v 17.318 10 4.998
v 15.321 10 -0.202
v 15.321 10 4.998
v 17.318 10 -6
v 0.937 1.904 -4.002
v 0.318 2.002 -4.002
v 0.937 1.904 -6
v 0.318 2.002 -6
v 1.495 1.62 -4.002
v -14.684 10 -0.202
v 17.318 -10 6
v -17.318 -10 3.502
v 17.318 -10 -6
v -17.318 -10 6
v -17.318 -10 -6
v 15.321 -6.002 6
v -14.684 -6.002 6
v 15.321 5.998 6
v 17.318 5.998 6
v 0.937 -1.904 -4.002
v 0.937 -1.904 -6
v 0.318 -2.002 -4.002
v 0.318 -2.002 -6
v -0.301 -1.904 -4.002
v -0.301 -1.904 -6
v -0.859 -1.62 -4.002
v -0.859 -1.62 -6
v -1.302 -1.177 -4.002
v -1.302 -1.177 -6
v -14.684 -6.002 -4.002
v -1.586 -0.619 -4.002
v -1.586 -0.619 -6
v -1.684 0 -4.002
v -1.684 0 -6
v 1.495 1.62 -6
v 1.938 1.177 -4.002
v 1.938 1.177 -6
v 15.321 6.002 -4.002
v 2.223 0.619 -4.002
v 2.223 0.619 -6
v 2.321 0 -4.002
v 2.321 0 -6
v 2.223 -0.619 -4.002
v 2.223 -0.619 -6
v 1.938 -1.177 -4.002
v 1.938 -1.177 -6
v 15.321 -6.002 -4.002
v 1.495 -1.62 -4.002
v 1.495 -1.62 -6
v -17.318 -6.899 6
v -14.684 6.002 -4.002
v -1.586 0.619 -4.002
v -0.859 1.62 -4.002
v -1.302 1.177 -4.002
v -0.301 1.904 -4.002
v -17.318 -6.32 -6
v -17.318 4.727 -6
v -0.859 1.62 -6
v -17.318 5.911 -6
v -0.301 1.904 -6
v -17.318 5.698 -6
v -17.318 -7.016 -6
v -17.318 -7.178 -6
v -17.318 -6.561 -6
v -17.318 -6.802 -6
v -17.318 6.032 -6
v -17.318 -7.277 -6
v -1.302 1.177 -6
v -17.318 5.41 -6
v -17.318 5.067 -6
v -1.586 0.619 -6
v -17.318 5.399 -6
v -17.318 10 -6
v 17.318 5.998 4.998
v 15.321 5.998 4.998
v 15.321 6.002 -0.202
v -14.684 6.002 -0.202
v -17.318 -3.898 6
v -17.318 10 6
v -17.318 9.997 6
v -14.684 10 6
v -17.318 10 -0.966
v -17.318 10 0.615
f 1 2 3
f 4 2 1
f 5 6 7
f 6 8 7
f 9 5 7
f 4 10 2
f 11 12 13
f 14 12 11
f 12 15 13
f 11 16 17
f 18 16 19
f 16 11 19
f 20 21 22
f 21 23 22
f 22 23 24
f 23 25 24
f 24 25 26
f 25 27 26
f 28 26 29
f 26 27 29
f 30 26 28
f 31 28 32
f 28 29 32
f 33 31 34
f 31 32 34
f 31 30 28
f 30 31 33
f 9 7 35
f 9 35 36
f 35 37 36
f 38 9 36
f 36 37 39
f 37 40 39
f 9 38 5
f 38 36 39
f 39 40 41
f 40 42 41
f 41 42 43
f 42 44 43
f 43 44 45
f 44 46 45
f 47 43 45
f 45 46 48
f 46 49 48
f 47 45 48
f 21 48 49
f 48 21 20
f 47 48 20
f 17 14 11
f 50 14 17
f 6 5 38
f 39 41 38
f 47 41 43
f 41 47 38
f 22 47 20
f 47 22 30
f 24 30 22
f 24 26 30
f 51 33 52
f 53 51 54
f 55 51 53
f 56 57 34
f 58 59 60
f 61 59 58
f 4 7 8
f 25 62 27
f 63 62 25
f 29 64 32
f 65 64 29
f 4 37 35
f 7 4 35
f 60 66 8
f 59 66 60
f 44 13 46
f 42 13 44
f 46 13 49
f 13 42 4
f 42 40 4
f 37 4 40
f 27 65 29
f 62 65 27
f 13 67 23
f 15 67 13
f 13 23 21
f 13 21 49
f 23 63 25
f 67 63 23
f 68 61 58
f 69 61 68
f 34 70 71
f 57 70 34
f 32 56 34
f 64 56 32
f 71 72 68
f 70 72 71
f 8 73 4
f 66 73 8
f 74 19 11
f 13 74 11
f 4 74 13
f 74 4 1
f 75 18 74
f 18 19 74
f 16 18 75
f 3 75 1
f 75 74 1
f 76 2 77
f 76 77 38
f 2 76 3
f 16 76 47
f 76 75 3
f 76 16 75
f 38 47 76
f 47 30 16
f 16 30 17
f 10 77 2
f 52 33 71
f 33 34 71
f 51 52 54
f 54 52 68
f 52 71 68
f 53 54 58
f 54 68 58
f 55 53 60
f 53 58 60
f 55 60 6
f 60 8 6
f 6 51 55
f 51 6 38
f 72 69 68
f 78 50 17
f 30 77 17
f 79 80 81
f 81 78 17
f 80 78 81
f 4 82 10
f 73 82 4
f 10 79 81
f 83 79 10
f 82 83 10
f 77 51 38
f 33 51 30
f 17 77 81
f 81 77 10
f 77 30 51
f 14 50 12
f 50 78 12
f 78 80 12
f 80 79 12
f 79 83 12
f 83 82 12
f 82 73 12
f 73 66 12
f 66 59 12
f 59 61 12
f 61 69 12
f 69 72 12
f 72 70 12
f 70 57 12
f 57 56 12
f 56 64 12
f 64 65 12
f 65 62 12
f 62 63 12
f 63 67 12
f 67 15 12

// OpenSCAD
// Generated from hotbed_foot_mount_v6.stl as explicit OpenSCAD polyhedron geometry.
// This file does not import or reference the STL; vertices/faces are embedded.
// Faces are wound for OpenSCAD; geometry was verified by STL export comparison.
// Source mesh: 166 triangles, 498 raw vertices; deduplicated to 83 vertices.

module hotbed_foot_mount_v6_v1() {
    polyhedron(
        points=[
            [15.320709, 10.000000, 4.998001],
            [17.317719, 10.000000, 4.998001],
            [15.320709, 10.000000, -0.202000],
            [17.317719, 10.000000, -6.000000],
            [0.936707, 1.903992, -6.000000],
            [0.936707, 1.903992, -4.001999],
            [0.317719, 2.001999, -4.001999],
            [0.317719, 2.001999, -6.000000],
            [1.494705, 1.619995, -4.001999],
            [-14.684296, 10.000000, -0.202000],
            [17.317719, -10.000000, -6.000000],
            [17.317719, -10.000000, 6.000000],
            [-17.317719, -10.000000, 3.502365],
            [-17.317719, -10.000000, 6.000000],
            [-17.317719, -10.000000, -6.000000],
            [-14.684296, -6.001999, 6.000000],
            [15.320709, -6.001999, 6.000000],
            [17.317719, 5.998001, 6.000000],
            [15.320709, 5.998001, 6.000000],
            [0.317719, -2.001999, -4.001999],
            [0.936707, -1.904007, -4.001999],
            [0.936707, -1.904007, -6.000000],
            [0.317719, -2.001999, -6.000000],
            [-0.301300, -1.904007, -4.001999],
            [-0.301300, -1.904007, -6.000000],
            [-0.859299, -1.619995, -4.001999],
            [-0.859299, -1.619995, -6.000000],
            [-1.302292, -1.177002, -6.000000],
            [-1.302292, -1.177002, -4.001999],
            [-14.684296, -6.001999, -4.001999],
            [-1.586288, -0.619003, -6.000000],
            [-1.586288, -0.619003, -4.001999],
            [-1.684296, 0.000000, -6.000000],
            [-1.684296, 0.000000, -4.001999],
            [1.494705, 1.619995, -6.000000],
            [1.937714, 1.177002, -4.001999],
            [1.937714, 1.177002, -6.000000],
            [15.320709, 6.001999, -4.001999],
            [2.222717, 0.618988, -4.001999],
            [2.222717, 0.618988, -6.000000],
            [2.320709, 0.000000, -4.001999],
            [2.320709, 0.000000, -6.000000],
            [2.222717, -0.619003, -4.001999],
            [2.222717, -0.619003, -6.000000],
            [1.937714, -1.177002, -4.001999],
            [1.937714, -1.177002, -6.000000],
            [15.320709, -6.001999, -4.001999],
            [1.494705, -1.619995, -4.001999],
            [1.494705, -1.619995, -6.000000],
            [-17.317719, -6.899017, 6.000000],
            [-1.586288, 0.618988, -4.001999],
            [-14.684296, 6.001999, -4.001999],
            [-1.302292, 1.177002, -4.001999],
            [-0.859299, 1.619995, -4.001999],
            [-0.301300, 1.903992, -4.001999],
            [-17.317719, -6.319824, -6.000000],
            [-17.317719, 4.726791, -6.000000],
            [-0.301300, 1.903992, -6.000000],
            [-0.859299, 1.619995, -6.000000],
            [-17.317719, 5.911011, -6.000000],
            [-17.317719, 5.697739, -6.000000],
            [-17.317719, -7.015549, -6.000000],
            [-17.317719, -7.178284, -6.000000],
            [-17.317719, -6.561249, -6.000000],
            [-17.317719, -6.802368, -6.000000],
            [-17.317719, 6.031937, -6.000000],
            [-17.317719, -7.276978, -6.000000],
            [-1.302292, 1.177002, -6.000000],
            [-17.317719, 5.410187, -6.000000],
            [-1.586288, 0.618988, -6.000000],
            [-17.317719, 5.067108, -6.000000],
            [-17.317719, 5.399155, -6.000000],
            [-17.317719, 10.000000, -6.000000],
            [17.317719, 5.998001, 4.998001],
            [15.320709, 5.998001, 4.998001],
            [-14.684296, 6.001999, -0.202000],
            [15.320709, 6.001999, -0.202000],
            [-17.317719, -3.897827, 6.000000],
            [-14.684296, 10.000000, 6.000000],
            [-17.317719, 10.000000, 6.000000],
            [-17.317719, 9.996964, 6.000000],
            [-17.317719, 10.000000, -0.965508],
            [-17.317719, 10.000000, 0.614704],
        ],
        faces=[
            [0, 2, 1],
            [1, 2, 3],
            [4, 6, 5],
            [4, 7, 6],
            [4, 5, 8],
            [2, 9, 3],
            [10, 12, 11],
            [11, 12, 13],
            [10, 14, 12],
            [15, 16, 11],
            [17, 16, 18],
            [17, 11, 16],
            [19, 21, 20],
            [19, 22, 21],
            [23, 22, 19],
            [23, 24, 22],
            [25, 24, 23],
            [25, 26, 24],
            [27, 25, 28],
            [27, 26, 25],
            [28, 25, 29],
            [30, 28, 31],
            [30, 27, 28],
            [32, 31, 33],
            [32, 30, 31],
            [28, 29, 31],
            [33, 31, 29],
            [34, 4, 8],
            [35, 34, 8],
            [35, 36, 34],
            [35, 8, 37],
            [38, 36, 35],
            [38, 39, 36],
            [5, 37, 8],
            [38, 35, 37],
            [40, 39, 38],
            [40, 41, 39],
            [42, 41, 40],
            [42, 43, 41],
            [44, 43, 42],
            [44, 45, 43],
            [44, 42, 46],
            [47, 45, 44],
            [47, 48, 45],
            [47, 44, 46],
            [48, 47, 21],
            [20, 21, 47],
            [20, 47, 46],
            [11, 13, 15],
            [15, 13, 49],
            [37, 5, 6],
            [37, 40, 38],
            [42, 40, 46],
            [37, 46, 40],
            [20, 46, 19],
            [29, 19, 46],
            [19, 29, 23],
            [29, 25, 23],
            [50, 33, 51],
            [52, 51, 53],
            [53, 51, 54],
            [32, 56, 55],
            [57, 59, 58],
            [58, 59, 60],
            [7, 4, 3],
            [26, 61, 24],
            [24, 61, 62],
            [30, 63, 27],
            [27, 63, 64],
            [34, 36, 3],
            [34, 3, 4],
            [7, 65, 57],
            [57, 65, 59],
            [45, 10, 43],
            [43, 10, 41],
            [48, 10, 45],
            [3, 41, 10],
            [3, 39, 41],
            [39, 3, 36],
            [27, 64, 26],
            [26, 64, 61],
            [22, 66, 10],
            [10, 66, 14],
            [21, 22, 10],
            [48, 21, 10],
            [24, 62, 22],
            [22, 62, 66],
            [58, 60, 67],
            [67, 60, 68],
            [69, 70, 32],
            [32, 70, 56],
            [32, 55, 30],
            [30, 55, 63],
            [67, 71, 69],
            [69, 71, 70],
            [3, 72, 7],
            [7, 72, 65],
            [11, 17, 73],
            [11, 73, 10],
            [10, 73, 3],
            [1, 3, 73],
            [73, 18, 74],
            [73, 17, 18],
            [74, 18, 16],
            [1, 74, 0],
            [1, 73, 74],
            [75, 2, 76],
            [37, 75, 76],
            [0, 76, 2],
            [46, 76, 16],
            [0, 74, 76],
            [74, 16, 76],
            [76, 46, 37],
            [16, 29, 46],
            [15, 29, 16],
            [2, 75, 9],
            [69, 33, 50],
            [69, 32, 33],
            [52, 50, 51],
            [67, 50, 52],
            [67, 69, 50],
            [58, 52, 53],
            [58, 67, 52],
            [57, 53, 54],
            [57, 58, 53],
            [6, 57, 54],
            [6, 7, 57],
            [54, 51, 6],
            [37, 6, 51],
            [67, 68, 71],
            [15, 49, 77],
            [15, 75, 29],
            [78, 80, 79],
            [15, 77, 78],
            [78, 77, 80],
            [9, 81, 3],
            [3, 81, 72],
            [78, 79, 9],
            [9, 79, 82],
            [9, 82, 81],
            [37, 51, 75],
            [29, 51, 33],
            [78, 75, 15],
            [9, 75, 78],
            [51, 29, 75],
            [12, 49, 13],
            [12, 77, 49],
            [12, 80, 77],
            [12, 79, 80],
            [12, 82, 79],
            [12, 81, 82],
            [12, 72, 81],
            [12, 65, 72],
            [12, 59, 65],
            [12, 60, 59],
            [12, 68, 60],
            [12, 71, 68],
            [12, 70, 71],
            [12, 56, 70],
            [12, 55, 56],
            [12, 63, 55],
            [12, 64, 63],
            [12, 61, 64],
            [12, 62, 61],
            [12, 66, 62],
            [12, 14, 66],
        ],
        convexity=10
    );
}

hotbed_foot_mount_v6_v1();
